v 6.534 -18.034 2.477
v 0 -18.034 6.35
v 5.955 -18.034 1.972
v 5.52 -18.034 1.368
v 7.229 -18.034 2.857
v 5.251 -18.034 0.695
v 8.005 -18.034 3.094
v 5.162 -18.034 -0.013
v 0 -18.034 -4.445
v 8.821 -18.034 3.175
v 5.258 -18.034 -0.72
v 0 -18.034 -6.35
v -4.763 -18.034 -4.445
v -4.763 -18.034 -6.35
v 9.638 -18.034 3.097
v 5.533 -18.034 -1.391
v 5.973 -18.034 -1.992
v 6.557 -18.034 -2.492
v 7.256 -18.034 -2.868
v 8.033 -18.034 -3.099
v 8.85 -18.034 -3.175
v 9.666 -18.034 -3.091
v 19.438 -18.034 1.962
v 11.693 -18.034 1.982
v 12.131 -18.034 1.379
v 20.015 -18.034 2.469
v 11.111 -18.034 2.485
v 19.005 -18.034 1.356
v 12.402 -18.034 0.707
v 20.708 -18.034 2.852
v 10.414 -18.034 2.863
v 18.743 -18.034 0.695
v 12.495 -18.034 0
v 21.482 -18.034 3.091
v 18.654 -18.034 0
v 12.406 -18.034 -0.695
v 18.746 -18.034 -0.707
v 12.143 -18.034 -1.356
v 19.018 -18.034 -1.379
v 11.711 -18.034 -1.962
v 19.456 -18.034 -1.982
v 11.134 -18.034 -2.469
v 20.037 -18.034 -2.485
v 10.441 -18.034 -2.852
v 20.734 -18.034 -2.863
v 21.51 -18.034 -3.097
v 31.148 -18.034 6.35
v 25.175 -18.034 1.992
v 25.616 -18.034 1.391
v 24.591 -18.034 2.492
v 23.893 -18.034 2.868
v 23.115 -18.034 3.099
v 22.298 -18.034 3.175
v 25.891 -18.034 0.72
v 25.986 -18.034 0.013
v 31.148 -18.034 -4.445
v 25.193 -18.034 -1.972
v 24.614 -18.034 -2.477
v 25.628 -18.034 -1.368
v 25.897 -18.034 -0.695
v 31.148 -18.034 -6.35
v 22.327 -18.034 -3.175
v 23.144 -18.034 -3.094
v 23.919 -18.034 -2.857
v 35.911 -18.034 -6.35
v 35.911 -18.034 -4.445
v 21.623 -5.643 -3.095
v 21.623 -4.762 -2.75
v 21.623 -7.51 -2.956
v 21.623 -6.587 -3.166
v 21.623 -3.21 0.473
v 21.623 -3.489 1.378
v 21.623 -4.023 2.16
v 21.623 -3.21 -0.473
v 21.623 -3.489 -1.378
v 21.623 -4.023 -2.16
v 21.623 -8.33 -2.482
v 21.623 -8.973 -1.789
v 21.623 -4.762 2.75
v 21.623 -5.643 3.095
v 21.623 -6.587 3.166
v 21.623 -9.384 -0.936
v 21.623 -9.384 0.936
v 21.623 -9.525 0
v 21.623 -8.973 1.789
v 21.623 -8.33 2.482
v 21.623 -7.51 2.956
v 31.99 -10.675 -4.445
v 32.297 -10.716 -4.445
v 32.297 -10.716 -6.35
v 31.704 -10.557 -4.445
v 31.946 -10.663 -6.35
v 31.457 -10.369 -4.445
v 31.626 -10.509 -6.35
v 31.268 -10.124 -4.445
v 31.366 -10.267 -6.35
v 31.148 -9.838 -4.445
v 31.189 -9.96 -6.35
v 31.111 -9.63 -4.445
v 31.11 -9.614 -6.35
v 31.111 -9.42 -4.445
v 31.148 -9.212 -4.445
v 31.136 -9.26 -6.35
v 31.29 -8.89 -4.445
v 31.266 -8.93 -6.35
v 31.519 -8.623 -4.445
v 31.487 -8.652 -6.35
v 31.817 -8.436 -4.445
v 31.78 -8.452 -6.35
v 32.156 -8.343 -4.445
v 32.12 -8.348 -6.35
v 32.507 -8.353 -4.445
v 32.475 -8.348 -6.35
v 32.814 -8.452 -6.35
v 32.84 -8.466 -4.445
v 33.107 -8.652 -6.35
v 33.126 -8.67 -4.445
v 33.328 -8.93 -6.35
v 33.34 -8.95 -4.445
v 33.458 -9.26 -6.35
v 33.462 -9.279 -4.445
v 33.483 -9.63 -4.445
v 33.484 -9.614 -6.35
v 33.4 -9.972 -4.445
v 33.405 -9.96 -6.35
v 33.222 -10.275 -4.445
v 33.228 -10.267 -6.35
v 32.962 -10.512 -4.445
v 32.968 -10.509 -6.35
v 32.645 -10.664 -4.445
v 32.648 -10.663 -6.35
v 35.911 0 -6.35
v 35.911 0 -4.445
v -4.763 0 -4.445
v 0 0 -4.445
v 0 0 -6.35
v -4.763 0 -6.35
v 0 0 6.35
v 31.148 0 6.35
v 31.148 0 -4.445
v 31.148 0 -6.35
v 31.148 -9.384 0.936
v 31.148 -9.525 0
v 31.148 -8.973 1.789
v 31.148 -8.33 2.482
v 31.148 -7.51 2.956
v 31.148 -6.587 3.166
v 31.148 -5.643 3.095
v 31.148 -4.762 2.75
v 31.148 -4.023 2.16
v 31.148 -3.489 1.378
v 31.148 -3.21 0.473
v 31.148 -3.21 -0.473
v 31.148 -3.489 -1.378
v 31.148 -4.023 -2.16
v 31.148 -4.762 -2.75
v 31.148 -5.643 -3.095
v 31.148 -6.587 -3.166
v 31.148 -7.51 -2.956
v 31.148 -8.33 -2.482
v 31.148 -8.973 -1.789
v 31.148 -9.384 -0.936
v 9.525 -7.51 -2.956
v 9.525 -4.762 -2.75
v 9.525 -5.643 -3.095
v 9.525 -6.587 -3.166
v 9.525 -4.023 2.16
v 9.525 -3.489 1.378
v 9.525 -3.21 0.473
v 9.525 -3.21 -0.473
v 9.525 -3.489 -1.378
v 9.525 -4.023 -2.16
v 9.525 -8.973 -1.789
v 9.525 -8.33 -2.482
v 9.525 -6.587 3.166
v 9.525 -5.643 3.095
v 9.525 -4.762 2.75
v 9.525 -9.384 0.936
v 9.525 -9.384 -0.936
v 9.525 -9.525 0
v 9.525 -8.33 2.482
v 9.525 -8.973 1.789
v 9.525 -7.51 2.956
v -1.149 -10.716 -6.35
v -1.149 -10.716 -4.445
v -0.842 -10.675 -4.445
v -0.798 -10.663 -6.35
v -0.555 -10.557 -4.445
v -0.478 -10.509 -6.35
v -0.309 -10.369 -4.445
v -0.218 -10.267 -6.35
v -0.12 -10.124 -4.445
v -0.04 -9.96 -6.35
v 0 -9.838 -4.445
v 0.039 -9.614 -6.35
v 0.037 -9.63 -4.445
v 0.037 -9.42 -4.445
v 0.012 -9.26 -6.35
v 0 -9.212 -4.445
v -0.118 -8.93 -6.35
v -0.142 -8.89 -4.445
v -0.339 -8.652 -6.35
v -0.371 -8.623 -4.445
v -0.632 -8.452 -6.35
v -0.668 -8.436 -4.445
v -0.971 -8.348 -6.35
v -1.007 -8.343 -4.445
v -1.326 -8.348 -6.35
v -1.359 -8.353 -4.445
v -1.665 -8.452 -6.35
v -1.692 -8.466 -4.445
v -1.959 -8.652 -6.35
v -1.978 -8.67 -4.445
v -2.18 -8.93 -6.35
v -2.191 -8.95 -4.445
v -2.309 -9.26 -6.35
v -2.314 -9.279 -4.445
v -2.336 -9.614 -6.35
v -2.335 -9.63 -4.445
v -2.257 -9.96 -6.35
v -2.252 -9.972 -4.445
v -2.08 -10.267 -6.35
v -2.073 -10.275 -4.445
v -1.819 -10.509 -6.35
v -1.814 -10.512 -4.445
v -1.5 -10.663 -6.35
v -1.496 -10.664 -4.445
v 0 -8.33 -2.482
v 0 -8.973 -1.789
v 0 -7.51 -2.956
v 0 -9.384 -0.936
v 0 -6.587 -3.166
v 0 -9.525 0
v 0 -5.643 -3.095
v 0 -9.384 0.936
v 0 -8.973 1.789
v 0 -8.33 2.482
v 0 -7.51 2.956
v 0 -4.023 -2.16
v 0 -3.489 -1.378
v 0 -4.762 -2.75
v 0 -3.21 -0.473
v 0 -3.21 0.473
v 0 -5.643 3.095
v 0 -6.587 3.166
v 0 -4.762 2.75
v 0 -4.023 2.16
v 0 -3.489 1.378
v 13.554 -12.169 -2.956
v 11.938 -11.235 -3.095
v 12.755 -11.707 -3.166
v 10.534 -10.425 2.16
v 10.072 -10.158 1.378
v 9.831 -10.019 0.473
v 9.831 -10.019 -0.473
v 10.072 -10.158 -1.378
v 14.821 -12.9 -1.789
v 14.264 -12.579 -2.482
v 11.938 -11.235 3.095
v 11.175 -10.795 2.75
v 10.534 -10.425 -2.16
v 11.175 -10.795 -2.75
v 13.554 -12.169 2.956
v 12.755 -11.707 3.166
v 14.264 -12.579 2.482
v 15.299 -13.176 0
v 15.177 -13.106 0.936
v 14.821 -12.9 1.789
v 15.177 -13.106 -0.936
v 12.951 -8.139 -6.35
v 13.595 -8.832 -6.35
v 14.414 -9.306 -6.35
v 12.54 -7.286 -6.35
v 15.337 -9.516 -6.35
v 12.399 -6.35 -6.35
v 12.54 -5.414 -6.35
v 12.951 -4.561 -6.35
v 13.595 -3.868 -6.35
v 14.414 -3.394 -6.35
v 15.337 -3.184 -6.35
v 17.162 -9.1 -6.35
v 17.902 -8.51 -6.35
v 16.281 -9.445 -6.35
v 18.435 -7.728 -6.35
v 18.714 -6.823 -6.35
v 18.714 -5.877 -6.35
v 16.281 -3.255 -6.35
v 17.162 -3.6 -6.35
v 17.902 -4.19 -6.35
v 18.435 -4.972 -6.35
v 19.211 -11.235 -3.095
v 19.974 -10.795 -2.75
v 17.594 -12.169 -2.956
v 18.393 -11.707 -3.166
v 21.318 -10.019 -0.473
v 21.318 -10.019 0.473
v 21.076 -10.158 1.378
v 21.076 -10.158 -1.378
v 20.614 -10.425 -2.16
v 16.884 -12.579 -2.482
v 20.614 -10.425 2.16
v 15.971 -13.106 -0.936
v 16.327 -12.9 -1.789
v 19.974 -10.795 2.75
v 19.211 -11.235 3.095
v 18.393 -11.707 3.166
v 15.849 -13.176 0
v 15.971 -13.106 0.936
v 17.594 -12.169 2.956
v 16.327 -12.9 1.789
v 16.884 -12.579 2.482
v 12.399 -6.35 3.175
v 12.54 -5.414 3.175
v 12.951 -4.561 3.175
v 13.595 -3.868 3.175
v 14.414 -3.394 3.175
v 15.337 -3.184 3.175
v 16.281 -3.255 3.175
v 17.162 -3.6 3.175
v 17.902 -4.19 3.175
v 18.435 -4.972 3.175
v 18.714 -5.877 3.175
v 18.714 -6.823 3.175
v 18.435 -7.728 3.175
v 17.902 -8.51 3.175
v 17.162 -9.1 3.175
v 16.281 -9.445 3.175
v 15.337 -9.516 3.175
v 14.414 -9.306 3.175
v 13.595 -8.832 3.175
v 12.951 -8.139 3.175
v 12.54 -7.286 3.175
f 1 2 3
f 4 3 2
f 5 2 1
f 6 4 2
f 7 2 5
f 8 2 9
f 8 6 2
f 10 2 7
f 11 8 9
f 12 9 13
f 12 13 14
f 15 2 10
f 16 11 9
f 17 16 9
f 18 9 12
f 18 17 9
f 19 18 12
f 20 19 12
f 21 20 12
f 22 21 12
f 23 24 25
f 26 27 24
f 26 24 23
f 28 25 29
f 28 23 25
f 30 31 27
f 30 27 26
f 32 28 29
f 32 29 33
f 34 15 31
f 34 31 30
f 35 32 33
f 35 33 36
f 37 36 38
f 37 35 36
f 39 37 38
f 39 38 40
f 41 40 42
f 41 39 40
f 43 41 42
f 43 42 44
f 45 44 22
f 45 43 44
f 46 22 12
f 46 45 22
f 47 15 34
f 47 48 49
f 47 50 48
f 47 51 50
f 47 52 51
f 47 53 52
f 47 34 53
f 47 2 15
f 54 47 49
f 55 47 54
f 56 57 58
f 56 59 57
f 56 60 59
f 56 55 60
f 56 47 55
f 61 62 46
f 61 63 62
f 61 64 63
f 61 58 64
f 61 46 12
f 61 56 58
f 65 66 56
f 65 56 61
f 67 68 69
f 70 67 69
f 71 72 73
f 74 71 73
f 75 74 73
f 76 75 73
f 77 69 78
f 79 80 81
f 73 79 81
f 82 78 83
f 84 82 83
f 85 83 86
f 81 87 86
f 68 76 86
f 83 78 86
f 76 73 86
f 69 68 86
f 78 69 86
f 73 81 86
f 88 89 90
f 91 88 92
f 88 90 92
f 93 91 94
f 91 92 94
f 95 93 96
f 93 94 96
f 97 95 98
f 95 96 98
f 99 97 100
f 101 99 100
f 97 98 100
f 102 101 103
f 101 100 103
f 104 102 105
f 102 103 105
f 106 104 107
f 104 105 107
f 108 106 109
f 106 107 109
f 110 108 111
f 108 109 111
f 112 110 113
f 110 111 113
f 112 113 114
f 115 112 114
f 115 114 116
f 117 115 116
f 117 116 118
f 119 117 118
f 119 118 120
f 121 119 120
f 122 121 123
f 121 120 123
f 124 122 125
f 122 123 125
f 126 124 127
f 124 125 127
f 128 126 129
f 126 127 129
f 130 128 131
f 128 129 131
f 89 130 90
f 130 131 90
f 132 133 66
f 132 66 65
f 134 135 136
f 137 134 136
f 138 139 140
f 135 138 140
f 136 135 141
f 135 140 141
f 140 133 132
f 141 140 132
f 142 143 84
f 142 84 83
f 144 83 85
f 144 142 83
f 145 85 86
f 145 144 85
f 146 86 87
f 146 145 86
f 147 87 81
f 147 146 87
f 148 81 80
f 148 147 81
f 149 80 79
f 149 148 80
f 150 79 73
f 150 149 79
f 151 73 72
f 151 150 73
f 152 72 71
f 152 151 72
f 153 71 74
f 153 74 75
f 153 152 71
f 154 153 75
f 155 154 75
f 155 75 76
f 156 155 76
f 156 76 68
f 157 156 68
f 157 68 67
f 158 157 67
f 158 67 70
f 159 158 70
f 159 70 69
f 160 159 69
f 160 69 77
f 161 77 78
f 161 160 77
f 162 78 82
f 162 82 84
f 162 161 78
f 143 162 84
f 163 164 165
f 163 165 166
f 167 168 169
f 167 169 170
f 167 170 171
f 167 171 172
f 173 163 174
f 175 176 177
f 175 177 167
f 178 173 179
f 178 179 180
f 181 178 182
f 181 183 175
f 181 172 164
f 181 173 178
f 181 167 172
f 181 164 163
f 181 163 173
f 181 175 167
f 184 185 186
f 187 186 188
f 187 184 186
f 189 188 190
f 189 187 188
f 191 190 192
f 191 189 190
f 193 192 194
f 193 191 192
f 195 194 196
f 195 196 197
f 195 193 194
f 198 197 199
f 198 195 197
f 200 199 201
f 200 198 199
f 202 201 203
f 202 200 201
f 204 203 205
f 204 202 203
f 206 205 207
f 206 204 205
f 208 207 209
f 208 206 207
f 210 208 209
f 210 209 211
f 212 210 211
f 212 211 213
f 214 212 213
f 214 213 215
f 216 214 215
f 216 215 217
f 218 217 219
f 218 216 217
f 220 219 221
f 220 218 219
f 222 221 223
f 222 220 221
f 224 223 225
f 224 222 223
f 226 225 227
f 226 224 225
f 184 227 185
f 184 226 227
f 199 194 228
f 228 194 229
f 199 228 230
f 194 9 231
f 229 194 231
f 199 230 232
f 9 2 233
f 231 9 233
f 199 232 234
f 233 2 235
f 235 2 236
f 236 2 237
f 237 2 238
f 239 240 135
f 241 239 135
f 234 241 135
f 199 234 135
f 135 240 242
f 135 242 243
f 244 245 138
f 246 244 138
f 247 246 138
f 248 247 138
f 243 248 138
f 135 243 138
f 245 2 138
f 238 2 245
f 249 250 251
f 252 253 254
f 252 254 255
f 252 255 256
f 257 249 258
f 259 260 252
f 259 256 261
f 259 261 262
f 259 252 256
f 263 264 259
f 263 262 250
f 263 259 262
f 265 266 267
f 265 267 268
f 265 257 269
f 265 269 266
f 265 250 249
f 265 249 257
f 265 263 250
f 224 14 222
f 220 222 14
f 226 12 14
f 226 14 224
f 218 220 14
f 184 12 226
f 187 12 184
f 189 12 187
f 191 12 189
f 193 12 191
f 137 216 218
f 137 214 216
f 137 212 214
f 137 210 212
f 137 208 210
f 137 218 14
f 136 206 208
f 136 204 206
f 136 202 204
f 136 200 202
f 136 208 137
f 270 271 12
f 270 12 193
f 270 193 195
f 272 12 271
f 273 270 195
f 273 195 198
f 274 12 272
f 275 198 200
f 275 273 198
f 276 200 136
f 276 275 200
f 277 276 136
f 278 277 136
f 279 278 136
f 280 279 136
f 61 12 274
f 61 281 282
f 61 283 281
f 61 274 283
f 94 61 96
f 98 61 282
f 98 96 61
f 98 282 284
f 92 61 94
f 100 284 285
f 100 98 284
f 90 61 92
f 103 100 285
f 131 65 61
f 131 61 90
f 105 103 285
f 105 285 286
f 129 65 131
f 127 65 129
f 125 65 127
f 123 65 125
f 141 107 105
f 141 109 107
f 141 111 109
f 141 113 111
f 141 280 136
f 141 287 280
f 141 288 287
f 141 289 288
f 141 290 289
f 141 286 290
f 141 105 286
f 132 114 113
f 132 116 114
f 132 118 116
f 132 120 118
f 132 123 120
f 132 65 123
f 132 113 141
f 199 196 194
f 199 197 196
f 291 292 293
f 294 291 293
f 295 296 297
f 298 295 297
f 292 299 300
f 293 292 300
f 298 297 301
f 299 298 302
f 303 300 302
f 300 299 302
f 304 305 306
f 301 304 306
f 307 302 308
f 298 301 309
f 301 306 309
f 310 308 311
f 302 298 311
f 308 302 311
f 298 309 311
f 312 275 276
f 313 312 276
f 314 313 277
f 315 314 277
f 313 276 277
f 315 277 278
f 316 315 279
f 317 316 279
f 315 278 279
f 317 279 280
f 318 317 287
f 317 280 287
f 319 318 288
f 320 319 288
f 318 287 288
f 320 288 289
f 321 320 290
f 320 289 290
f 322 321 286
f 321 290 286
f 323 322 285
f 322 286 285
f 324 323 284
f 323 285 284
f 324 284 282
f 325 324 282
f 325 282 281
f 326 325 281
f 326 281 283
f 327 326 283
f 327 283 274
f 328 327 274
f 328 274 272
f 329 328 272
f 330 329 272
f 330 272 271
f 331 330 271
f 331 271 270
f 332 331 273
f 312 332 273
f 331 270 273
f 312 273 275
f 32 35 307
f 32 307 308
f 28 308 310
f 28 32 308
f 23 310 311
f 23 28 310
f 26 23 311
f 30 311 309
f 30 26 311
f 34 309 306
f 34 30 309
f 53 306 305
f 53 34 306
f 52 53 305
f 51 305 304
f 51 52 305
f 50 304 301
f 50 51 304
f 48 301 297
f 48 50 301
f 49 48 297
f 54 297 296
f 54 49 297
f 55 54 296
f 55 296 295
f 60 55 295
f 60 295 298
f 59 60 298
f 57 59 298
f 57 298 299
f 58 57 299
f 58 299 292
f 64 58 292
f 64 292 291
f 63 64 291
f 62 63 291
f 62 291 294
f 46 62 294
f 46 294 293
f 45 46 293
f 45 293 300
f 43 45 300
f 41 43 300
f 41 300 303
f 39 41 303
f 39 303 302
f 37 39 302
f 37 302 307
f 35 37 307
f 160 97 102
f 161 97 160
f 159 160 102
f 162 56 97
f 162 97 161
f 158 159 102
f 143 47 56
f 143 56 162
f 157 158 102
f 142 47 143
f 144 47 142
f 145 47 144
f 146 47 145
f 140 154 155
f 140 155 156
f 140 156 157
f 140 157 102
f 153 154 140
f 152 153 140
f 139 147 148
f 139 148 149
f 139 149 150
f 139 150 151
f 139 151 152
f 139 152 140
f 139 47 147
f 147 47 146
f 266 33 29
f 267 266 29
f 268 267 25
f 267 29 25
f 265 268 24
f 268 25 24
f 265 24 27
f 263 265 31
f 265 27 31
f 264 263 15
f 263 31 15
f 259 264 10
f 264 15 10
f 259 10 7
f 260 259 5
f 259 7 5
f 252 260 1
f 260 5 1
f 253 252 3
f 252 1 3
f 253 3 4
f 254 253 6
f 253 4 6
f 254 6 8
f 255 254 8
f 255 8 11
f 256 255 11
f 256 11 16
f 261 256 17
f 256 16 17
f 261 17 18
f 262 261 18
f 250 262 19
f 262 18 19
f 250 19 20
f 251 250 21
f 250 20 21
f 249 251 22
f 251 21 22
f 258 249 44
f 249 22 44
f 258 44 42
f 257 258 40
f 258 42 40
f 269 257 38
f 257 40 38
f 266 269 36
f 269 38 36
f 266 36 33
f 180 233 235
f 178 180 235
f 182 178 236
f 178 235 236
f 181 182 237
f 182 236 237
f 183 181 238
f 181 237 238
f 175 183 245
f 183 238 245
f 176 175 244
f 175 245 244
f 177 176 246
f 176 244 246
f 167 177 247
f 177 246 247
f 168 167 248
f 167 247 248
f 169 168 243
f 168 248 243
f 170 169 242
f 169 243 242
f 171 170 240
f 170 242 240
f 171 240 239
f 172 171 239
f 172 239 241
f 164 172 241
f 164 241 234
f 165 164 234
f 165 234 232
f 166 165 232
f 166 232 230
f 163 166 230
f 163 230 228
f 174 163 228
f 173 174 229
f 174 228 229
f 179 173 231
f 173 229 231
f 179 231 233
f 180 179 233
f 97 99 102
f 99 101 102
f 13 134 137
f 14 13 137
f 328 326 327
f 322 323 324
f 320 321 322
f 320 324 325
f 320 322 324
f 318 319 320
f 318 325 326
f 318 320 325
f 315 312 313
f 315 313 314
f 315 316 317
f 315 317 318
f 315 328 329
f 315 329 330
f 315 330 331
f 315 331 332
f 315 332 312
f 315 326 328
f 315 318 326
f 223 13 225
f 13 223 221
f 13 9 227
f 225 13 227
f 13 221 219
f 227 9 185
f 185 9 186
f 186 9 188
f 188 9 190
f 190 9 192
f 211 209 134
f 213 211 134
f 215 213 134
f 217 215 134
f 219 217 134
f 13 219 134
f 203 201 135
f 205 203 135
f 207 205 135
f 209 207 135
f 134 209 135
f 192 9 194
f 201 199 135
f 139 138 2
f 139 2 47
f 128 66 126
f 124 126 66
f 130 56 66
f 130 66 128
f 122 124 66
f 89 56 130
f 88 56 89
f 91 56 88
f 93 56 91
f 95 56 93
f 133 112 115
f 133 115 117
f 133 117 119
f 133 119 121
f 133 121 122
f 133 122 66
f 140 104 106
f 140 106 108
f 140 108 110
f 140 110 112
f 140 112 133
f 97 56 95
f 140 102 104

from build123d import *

# Parameters (mm, degrees)
SKETCH3_W                      = 31.148374891
SKETCH3_H                      = 19.837641971
BOSS_EXTRUDE1_DEPTH            = 6.35
SKETCH4_R                      = 3.175
CUT_EXTRUDE1_DEPTH             = 9.525
SKETCH5_R                      = 3.175
CUT_EXTRUDE5_DEPTH             = 9.525
CUT_EXTRUDE5_DIRECTION_2_REACH = 33.299
SKETCH6_R                      = 3.175
CUT_EXTRUDE6_DEPTH             = 9.525
SKETCH8_W                      = 12.7
SKETCH8_H                      = 1.803641971
CUT_EXTRUDE7_DEPTH             = 38.470999417
SKETCH9_W                      = 1.905
SKETCH9_H                      = 18.034
BOSS_EXTRUDE2_DEPTH            = 4.7625
SKETCH11_W                     = 1.190625
SKETCH11_H                     = 1.906


with BuildPart() as part:
    # Sketch3 → Boss-Extrude1 (new, symmetric)
    with BuildSketch(Plane.XY):
        with Locations((15.574187446, -9.918820986)):
            Rectangle(SKETCH3_W, SKETCH3_H)
    extrude(amount=BOSS_EXTRUDE1_DEPTH, both=True)

    # Sketch4 → Cut-Extrude1 (cut)
    with BuildSketch(Plane.ZY):
        with Locations(Location((0, -6.35, 0), (0, 0, 270))):
            Circle(SKETCH4_R)
    cut_extrude1 = extrude(amount=-CUT_EXTRUDE1_DEPTH, mode=Mode.SUBTRACT)

    # Sketch5 → Cut-Extrude5 (cut)
    with BuildSketch(Plane(origin=(7.787093723, -19.837641971, 0), x_dir=(-0.8660254037844382, 0.500000000000001, 0), z_dir=(-0.500000000000001, -0.8660254037844382, 0))):
        with Locations(Location((0, 0, 0), (0, 0, 180))):
            Circle(SKETCH5_R)
    cut_extrude5 = extrude(amount=-CUT_EXTRUDE5_DEPTH, mode=Mode.SUBTRACT)

    # Sketch5 → Cut-Extrude5 direction 2 (cut, up to next)
    with BuildSketch(Plane(origin=(7.787093723, -19.837641971, 0), x_dir=(-0.8660254037844382, 0.500000000000001, 0), z_dir=(-0.500000000000001, -0.8660254037844382, 0)), mode=Mode.PRIVATE) as cut_extrude5_direction_2_sk1:
        with Locations(Location((0, 0, 0), (0, 0, 180))):
            Circle(SKETCH5_R)
    cut_extrude5_direction_2_tool1 = extrude(cut_extrude5_direction_2_sk1.sketch, amount=CUT_EXTRUDE5_DIRECTION_2_REACH, mode=Mode.PRIVATE) & part.part
    cut_extrude5_direction_2 = cut_extrude5_direction_2_tool1.solids().sort_by_distance((7.787094, -19.837642, 0))[0]
    add(cut_extrude5_direction_2, mode=Mode.SUBTRACT)

    # Sketch6 → Cut-Extrude6 (cut)
    with BuildSketch(Plane(origin=(0, 0, -6.35), x_dir=(-1, 0, 0), z_dir=(0, 0, -1))):
        with Locations((-15.574187445, -6.35)):
            Circle(SKETCH6_R)
    extrude(amount=-CUT_EXTRUDE6_DEPTH, mode=Mode.SUBTRACT)

    # Mirror1: Cut-Extrude1, Cut-Extrude5, Cut-Extrude5 direction 2 across plane
    add(cut_extrude1.mirror(Plane.ZY.offset(-15.574187445)), mode=Mode.SUBTRACT)
    add(cut_extrude5.mirror(Plane.ZY.offset(-15.574187445)), mode=Mode.SUBTRACT)
    add(cut_extrude5_direction_2.mirror(Plane.ZY.offset(-15.574187445)), mode=Mode.SUBTRACT)

    # Sketch8 → Cut-Extrude7 (cut, through all)
    with BuildSketch(Plane(origin=(31.148374891, 0, 0), x_dir=(0, 0, -1), z_dir=(1, 0, 0))):
        with Locations((0, -18.935820986)):
            Rectangle(SKETCH8_W, SKETCH8_H)
    extrude(amount=-CUT_EXTRUDE7_DEPTH, mode=Mode.SUBTRACT)

    # Sketch9 → Boss-Extrude2 (add)
    with BuildSketch(Plane(origin=(31.148374891, 0, 0), x_dir=(0, 0, -1), z_dir=(1, 0, 0))):
        with Locations((5.3975, -9.017)):
            Rectangle(SKETCH9_W, SKETCH9_H)
    boss_extrude2 = extrude(amount=BOSS_EXTRUDE2_DEPTH)

    # Sketch11 → 3/32 (0.09375) Diameter Hole1 (revolve, cut)
    with BuildSketch(Plane(origin=(32.297076923, -9.525, -4.445), x_dir=(0, -1, 0), z_dir=(1, 0, 0))):
        with Locations((0.5953125, 0.953)):
            Rectangle(SKETCH11_W, SKETCH11_H)
    f_3_32_0_09375_diameter_hole1 = revolve(axis=Axis((32.297076923, -9.525, 1.905), (0, 0, -1)), mode=Mode.SUBTRACT)

    # Mirror2: Boss-Extrude2, 3/32 (0.09375) Diameter Hole1 across plane
    add(boss_extrude2.mirror(Plane.ZY.offset(-15.574187445)))
    add(f_3_32_0_09375_diameter_hole1.mirror(Plane.ZY.offset(-15.574187445)), mode=Mode.SUBTRACT)


solid = part.part
